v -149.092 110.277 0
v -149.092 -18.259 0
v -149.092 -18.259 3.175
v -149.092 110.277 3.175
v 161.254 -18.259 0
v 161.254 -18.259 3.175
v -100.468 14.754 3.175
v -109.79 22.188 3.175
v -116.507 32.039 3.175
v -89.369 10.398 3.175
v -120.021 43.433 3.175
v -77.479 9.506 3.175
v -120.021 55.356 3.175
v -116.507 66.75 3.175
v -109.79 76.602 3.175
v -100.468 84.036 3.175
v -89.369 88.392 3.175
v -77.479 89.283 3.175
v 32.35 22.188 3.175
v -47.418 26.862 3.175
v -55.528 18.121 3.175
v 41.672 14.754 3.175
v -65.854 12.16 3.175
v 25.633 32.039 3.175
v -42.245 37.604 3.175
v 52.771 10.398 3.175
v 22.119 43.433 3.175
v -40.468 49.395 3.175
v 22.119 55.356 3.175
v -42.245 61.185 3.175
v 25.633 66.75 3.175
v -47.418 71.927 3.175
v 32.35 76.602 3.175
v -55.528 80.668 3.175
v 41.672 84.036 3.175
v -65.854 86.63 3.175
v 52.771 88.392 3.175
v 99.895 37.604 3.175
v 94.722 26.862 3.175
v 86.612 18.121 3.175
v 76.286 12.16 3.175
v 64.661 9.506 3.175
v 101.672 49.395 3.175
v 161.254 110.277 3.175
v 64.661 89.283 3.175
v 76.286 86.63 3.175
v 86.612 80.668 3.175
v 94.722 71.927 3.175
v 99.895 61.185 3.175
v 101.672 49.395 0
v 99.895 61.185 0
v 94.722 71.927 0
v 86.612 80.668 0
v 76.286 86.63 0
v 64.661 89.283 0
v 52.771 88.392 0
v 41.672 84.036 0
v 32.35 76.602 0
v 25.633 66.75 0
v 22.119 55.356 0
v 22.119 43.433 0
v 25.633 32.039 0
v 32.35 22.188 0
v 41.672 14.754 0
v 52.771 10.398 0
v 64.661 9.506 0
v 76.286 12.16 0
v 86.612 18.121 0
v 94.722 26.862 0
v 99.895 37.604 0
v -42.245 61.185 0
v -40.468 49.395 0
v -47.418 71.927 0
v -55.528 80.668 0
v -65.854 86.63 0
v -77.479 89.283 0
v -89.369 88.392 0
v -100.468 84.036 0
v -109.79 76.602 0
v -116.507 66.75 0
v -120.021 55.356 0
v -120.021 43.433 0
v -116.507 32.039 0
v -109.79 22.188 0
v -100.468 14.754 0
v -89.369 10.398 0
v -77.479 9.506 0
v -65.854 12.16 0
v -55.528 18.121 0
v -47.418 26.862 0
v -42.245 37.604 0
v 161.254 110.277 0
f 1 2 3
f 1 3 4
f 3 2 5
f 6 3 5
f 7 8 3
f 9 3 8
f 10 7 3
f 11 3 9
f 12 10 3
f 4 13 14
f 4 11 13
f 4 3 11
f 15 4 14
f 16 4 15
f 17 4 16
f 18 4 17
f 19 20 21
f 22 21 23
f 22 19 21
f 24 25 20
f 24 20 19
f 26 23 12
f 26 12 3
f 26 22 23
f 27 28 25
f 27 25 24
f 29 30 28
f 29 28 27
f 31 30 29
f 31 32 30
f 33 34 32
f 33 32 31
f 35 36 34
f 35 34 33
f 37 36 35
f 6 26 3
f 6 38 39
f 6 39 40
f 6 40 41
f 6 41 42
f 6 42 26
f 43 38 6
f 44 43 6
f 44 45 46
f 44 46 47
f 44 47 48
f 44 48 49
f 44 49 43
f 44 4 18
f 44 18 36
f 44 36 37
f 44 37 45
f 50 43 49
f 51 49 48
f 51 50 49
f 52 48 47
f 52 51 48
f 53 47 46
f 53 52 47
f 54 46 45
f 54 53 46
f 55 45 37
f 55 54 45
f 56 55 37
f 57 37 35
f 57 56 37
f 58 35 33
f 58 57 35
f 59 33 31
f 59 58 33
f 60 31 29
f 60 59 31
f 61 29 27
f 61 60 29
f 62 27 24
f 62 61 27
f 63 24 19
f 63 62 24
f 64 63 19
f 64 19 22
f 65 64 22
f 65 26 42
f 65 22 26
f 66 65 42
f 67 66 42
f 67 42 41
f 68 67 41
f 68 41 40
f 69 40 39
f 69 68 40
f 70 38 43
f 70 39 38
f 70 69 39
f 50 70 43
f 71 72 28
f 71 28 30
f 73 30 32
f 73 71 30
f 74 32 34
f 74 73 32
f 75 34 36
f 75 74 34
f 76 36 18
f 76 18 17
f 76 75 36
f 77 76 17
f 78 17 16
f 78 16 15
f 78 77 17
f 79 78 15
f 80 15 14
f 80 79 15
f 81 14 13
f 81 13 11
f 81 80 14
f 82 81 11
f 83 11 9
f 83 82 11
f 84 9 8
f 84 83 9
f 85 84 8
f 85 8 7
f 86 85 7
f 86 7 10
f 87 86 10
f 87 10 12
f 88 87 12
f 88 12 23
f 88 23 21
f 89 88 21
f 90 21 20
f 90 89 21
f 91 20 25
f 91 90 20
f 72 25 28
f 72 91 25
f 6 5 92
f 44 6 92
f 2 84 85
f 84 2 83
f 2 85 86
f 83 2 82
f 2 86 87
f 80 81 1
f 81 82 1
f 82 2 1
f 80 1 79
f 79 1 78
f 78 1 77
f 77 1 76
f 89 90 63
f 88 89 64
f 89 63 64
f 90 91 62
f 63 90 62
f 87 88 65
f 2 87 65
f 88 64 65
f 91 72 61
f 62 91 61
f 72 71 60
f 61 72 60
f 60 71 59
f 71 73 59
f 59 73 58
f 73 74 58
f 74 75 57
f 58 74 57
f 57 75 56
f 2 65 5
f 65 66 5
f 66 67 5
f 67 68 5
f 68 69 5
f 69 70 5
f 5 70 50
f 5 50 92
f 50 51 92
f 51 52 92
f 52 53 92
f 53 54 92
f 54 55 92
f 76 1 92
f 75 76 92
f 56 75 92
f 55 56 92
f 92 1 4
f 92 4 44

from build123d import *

# Parameters (mm, degrees)
F1_W     = 310.345411
F1_H     = 128.536235
F1_R     = 40
F3_DEPTH = 3.175
F4_R     = 40
F5_DEPTH = 25.4


with BuildPart() as f3:
    # F1 (on face) → F3 (new body)
    with BuildSketch(Plane.XY):
        with Locations((6.08109, 46.009373)):
            Rectangle(F1_W, F1_H)
        with Locations((-80.468008, 49.394639)):
            Circle(F1_R, mode=Mode.SUBTRACT)
    extrude(amount=F3_DEPTH)

    # F4 (on face) → F5 (cut)
    with BuildSketch(Plane.XY):
        with Locations((61.672111, 49.394639)):
            Circle(F4_R)
    extrude(amount=F5_DEPTH, mode=Mode.SUBTRACT)


solid = f3.part
